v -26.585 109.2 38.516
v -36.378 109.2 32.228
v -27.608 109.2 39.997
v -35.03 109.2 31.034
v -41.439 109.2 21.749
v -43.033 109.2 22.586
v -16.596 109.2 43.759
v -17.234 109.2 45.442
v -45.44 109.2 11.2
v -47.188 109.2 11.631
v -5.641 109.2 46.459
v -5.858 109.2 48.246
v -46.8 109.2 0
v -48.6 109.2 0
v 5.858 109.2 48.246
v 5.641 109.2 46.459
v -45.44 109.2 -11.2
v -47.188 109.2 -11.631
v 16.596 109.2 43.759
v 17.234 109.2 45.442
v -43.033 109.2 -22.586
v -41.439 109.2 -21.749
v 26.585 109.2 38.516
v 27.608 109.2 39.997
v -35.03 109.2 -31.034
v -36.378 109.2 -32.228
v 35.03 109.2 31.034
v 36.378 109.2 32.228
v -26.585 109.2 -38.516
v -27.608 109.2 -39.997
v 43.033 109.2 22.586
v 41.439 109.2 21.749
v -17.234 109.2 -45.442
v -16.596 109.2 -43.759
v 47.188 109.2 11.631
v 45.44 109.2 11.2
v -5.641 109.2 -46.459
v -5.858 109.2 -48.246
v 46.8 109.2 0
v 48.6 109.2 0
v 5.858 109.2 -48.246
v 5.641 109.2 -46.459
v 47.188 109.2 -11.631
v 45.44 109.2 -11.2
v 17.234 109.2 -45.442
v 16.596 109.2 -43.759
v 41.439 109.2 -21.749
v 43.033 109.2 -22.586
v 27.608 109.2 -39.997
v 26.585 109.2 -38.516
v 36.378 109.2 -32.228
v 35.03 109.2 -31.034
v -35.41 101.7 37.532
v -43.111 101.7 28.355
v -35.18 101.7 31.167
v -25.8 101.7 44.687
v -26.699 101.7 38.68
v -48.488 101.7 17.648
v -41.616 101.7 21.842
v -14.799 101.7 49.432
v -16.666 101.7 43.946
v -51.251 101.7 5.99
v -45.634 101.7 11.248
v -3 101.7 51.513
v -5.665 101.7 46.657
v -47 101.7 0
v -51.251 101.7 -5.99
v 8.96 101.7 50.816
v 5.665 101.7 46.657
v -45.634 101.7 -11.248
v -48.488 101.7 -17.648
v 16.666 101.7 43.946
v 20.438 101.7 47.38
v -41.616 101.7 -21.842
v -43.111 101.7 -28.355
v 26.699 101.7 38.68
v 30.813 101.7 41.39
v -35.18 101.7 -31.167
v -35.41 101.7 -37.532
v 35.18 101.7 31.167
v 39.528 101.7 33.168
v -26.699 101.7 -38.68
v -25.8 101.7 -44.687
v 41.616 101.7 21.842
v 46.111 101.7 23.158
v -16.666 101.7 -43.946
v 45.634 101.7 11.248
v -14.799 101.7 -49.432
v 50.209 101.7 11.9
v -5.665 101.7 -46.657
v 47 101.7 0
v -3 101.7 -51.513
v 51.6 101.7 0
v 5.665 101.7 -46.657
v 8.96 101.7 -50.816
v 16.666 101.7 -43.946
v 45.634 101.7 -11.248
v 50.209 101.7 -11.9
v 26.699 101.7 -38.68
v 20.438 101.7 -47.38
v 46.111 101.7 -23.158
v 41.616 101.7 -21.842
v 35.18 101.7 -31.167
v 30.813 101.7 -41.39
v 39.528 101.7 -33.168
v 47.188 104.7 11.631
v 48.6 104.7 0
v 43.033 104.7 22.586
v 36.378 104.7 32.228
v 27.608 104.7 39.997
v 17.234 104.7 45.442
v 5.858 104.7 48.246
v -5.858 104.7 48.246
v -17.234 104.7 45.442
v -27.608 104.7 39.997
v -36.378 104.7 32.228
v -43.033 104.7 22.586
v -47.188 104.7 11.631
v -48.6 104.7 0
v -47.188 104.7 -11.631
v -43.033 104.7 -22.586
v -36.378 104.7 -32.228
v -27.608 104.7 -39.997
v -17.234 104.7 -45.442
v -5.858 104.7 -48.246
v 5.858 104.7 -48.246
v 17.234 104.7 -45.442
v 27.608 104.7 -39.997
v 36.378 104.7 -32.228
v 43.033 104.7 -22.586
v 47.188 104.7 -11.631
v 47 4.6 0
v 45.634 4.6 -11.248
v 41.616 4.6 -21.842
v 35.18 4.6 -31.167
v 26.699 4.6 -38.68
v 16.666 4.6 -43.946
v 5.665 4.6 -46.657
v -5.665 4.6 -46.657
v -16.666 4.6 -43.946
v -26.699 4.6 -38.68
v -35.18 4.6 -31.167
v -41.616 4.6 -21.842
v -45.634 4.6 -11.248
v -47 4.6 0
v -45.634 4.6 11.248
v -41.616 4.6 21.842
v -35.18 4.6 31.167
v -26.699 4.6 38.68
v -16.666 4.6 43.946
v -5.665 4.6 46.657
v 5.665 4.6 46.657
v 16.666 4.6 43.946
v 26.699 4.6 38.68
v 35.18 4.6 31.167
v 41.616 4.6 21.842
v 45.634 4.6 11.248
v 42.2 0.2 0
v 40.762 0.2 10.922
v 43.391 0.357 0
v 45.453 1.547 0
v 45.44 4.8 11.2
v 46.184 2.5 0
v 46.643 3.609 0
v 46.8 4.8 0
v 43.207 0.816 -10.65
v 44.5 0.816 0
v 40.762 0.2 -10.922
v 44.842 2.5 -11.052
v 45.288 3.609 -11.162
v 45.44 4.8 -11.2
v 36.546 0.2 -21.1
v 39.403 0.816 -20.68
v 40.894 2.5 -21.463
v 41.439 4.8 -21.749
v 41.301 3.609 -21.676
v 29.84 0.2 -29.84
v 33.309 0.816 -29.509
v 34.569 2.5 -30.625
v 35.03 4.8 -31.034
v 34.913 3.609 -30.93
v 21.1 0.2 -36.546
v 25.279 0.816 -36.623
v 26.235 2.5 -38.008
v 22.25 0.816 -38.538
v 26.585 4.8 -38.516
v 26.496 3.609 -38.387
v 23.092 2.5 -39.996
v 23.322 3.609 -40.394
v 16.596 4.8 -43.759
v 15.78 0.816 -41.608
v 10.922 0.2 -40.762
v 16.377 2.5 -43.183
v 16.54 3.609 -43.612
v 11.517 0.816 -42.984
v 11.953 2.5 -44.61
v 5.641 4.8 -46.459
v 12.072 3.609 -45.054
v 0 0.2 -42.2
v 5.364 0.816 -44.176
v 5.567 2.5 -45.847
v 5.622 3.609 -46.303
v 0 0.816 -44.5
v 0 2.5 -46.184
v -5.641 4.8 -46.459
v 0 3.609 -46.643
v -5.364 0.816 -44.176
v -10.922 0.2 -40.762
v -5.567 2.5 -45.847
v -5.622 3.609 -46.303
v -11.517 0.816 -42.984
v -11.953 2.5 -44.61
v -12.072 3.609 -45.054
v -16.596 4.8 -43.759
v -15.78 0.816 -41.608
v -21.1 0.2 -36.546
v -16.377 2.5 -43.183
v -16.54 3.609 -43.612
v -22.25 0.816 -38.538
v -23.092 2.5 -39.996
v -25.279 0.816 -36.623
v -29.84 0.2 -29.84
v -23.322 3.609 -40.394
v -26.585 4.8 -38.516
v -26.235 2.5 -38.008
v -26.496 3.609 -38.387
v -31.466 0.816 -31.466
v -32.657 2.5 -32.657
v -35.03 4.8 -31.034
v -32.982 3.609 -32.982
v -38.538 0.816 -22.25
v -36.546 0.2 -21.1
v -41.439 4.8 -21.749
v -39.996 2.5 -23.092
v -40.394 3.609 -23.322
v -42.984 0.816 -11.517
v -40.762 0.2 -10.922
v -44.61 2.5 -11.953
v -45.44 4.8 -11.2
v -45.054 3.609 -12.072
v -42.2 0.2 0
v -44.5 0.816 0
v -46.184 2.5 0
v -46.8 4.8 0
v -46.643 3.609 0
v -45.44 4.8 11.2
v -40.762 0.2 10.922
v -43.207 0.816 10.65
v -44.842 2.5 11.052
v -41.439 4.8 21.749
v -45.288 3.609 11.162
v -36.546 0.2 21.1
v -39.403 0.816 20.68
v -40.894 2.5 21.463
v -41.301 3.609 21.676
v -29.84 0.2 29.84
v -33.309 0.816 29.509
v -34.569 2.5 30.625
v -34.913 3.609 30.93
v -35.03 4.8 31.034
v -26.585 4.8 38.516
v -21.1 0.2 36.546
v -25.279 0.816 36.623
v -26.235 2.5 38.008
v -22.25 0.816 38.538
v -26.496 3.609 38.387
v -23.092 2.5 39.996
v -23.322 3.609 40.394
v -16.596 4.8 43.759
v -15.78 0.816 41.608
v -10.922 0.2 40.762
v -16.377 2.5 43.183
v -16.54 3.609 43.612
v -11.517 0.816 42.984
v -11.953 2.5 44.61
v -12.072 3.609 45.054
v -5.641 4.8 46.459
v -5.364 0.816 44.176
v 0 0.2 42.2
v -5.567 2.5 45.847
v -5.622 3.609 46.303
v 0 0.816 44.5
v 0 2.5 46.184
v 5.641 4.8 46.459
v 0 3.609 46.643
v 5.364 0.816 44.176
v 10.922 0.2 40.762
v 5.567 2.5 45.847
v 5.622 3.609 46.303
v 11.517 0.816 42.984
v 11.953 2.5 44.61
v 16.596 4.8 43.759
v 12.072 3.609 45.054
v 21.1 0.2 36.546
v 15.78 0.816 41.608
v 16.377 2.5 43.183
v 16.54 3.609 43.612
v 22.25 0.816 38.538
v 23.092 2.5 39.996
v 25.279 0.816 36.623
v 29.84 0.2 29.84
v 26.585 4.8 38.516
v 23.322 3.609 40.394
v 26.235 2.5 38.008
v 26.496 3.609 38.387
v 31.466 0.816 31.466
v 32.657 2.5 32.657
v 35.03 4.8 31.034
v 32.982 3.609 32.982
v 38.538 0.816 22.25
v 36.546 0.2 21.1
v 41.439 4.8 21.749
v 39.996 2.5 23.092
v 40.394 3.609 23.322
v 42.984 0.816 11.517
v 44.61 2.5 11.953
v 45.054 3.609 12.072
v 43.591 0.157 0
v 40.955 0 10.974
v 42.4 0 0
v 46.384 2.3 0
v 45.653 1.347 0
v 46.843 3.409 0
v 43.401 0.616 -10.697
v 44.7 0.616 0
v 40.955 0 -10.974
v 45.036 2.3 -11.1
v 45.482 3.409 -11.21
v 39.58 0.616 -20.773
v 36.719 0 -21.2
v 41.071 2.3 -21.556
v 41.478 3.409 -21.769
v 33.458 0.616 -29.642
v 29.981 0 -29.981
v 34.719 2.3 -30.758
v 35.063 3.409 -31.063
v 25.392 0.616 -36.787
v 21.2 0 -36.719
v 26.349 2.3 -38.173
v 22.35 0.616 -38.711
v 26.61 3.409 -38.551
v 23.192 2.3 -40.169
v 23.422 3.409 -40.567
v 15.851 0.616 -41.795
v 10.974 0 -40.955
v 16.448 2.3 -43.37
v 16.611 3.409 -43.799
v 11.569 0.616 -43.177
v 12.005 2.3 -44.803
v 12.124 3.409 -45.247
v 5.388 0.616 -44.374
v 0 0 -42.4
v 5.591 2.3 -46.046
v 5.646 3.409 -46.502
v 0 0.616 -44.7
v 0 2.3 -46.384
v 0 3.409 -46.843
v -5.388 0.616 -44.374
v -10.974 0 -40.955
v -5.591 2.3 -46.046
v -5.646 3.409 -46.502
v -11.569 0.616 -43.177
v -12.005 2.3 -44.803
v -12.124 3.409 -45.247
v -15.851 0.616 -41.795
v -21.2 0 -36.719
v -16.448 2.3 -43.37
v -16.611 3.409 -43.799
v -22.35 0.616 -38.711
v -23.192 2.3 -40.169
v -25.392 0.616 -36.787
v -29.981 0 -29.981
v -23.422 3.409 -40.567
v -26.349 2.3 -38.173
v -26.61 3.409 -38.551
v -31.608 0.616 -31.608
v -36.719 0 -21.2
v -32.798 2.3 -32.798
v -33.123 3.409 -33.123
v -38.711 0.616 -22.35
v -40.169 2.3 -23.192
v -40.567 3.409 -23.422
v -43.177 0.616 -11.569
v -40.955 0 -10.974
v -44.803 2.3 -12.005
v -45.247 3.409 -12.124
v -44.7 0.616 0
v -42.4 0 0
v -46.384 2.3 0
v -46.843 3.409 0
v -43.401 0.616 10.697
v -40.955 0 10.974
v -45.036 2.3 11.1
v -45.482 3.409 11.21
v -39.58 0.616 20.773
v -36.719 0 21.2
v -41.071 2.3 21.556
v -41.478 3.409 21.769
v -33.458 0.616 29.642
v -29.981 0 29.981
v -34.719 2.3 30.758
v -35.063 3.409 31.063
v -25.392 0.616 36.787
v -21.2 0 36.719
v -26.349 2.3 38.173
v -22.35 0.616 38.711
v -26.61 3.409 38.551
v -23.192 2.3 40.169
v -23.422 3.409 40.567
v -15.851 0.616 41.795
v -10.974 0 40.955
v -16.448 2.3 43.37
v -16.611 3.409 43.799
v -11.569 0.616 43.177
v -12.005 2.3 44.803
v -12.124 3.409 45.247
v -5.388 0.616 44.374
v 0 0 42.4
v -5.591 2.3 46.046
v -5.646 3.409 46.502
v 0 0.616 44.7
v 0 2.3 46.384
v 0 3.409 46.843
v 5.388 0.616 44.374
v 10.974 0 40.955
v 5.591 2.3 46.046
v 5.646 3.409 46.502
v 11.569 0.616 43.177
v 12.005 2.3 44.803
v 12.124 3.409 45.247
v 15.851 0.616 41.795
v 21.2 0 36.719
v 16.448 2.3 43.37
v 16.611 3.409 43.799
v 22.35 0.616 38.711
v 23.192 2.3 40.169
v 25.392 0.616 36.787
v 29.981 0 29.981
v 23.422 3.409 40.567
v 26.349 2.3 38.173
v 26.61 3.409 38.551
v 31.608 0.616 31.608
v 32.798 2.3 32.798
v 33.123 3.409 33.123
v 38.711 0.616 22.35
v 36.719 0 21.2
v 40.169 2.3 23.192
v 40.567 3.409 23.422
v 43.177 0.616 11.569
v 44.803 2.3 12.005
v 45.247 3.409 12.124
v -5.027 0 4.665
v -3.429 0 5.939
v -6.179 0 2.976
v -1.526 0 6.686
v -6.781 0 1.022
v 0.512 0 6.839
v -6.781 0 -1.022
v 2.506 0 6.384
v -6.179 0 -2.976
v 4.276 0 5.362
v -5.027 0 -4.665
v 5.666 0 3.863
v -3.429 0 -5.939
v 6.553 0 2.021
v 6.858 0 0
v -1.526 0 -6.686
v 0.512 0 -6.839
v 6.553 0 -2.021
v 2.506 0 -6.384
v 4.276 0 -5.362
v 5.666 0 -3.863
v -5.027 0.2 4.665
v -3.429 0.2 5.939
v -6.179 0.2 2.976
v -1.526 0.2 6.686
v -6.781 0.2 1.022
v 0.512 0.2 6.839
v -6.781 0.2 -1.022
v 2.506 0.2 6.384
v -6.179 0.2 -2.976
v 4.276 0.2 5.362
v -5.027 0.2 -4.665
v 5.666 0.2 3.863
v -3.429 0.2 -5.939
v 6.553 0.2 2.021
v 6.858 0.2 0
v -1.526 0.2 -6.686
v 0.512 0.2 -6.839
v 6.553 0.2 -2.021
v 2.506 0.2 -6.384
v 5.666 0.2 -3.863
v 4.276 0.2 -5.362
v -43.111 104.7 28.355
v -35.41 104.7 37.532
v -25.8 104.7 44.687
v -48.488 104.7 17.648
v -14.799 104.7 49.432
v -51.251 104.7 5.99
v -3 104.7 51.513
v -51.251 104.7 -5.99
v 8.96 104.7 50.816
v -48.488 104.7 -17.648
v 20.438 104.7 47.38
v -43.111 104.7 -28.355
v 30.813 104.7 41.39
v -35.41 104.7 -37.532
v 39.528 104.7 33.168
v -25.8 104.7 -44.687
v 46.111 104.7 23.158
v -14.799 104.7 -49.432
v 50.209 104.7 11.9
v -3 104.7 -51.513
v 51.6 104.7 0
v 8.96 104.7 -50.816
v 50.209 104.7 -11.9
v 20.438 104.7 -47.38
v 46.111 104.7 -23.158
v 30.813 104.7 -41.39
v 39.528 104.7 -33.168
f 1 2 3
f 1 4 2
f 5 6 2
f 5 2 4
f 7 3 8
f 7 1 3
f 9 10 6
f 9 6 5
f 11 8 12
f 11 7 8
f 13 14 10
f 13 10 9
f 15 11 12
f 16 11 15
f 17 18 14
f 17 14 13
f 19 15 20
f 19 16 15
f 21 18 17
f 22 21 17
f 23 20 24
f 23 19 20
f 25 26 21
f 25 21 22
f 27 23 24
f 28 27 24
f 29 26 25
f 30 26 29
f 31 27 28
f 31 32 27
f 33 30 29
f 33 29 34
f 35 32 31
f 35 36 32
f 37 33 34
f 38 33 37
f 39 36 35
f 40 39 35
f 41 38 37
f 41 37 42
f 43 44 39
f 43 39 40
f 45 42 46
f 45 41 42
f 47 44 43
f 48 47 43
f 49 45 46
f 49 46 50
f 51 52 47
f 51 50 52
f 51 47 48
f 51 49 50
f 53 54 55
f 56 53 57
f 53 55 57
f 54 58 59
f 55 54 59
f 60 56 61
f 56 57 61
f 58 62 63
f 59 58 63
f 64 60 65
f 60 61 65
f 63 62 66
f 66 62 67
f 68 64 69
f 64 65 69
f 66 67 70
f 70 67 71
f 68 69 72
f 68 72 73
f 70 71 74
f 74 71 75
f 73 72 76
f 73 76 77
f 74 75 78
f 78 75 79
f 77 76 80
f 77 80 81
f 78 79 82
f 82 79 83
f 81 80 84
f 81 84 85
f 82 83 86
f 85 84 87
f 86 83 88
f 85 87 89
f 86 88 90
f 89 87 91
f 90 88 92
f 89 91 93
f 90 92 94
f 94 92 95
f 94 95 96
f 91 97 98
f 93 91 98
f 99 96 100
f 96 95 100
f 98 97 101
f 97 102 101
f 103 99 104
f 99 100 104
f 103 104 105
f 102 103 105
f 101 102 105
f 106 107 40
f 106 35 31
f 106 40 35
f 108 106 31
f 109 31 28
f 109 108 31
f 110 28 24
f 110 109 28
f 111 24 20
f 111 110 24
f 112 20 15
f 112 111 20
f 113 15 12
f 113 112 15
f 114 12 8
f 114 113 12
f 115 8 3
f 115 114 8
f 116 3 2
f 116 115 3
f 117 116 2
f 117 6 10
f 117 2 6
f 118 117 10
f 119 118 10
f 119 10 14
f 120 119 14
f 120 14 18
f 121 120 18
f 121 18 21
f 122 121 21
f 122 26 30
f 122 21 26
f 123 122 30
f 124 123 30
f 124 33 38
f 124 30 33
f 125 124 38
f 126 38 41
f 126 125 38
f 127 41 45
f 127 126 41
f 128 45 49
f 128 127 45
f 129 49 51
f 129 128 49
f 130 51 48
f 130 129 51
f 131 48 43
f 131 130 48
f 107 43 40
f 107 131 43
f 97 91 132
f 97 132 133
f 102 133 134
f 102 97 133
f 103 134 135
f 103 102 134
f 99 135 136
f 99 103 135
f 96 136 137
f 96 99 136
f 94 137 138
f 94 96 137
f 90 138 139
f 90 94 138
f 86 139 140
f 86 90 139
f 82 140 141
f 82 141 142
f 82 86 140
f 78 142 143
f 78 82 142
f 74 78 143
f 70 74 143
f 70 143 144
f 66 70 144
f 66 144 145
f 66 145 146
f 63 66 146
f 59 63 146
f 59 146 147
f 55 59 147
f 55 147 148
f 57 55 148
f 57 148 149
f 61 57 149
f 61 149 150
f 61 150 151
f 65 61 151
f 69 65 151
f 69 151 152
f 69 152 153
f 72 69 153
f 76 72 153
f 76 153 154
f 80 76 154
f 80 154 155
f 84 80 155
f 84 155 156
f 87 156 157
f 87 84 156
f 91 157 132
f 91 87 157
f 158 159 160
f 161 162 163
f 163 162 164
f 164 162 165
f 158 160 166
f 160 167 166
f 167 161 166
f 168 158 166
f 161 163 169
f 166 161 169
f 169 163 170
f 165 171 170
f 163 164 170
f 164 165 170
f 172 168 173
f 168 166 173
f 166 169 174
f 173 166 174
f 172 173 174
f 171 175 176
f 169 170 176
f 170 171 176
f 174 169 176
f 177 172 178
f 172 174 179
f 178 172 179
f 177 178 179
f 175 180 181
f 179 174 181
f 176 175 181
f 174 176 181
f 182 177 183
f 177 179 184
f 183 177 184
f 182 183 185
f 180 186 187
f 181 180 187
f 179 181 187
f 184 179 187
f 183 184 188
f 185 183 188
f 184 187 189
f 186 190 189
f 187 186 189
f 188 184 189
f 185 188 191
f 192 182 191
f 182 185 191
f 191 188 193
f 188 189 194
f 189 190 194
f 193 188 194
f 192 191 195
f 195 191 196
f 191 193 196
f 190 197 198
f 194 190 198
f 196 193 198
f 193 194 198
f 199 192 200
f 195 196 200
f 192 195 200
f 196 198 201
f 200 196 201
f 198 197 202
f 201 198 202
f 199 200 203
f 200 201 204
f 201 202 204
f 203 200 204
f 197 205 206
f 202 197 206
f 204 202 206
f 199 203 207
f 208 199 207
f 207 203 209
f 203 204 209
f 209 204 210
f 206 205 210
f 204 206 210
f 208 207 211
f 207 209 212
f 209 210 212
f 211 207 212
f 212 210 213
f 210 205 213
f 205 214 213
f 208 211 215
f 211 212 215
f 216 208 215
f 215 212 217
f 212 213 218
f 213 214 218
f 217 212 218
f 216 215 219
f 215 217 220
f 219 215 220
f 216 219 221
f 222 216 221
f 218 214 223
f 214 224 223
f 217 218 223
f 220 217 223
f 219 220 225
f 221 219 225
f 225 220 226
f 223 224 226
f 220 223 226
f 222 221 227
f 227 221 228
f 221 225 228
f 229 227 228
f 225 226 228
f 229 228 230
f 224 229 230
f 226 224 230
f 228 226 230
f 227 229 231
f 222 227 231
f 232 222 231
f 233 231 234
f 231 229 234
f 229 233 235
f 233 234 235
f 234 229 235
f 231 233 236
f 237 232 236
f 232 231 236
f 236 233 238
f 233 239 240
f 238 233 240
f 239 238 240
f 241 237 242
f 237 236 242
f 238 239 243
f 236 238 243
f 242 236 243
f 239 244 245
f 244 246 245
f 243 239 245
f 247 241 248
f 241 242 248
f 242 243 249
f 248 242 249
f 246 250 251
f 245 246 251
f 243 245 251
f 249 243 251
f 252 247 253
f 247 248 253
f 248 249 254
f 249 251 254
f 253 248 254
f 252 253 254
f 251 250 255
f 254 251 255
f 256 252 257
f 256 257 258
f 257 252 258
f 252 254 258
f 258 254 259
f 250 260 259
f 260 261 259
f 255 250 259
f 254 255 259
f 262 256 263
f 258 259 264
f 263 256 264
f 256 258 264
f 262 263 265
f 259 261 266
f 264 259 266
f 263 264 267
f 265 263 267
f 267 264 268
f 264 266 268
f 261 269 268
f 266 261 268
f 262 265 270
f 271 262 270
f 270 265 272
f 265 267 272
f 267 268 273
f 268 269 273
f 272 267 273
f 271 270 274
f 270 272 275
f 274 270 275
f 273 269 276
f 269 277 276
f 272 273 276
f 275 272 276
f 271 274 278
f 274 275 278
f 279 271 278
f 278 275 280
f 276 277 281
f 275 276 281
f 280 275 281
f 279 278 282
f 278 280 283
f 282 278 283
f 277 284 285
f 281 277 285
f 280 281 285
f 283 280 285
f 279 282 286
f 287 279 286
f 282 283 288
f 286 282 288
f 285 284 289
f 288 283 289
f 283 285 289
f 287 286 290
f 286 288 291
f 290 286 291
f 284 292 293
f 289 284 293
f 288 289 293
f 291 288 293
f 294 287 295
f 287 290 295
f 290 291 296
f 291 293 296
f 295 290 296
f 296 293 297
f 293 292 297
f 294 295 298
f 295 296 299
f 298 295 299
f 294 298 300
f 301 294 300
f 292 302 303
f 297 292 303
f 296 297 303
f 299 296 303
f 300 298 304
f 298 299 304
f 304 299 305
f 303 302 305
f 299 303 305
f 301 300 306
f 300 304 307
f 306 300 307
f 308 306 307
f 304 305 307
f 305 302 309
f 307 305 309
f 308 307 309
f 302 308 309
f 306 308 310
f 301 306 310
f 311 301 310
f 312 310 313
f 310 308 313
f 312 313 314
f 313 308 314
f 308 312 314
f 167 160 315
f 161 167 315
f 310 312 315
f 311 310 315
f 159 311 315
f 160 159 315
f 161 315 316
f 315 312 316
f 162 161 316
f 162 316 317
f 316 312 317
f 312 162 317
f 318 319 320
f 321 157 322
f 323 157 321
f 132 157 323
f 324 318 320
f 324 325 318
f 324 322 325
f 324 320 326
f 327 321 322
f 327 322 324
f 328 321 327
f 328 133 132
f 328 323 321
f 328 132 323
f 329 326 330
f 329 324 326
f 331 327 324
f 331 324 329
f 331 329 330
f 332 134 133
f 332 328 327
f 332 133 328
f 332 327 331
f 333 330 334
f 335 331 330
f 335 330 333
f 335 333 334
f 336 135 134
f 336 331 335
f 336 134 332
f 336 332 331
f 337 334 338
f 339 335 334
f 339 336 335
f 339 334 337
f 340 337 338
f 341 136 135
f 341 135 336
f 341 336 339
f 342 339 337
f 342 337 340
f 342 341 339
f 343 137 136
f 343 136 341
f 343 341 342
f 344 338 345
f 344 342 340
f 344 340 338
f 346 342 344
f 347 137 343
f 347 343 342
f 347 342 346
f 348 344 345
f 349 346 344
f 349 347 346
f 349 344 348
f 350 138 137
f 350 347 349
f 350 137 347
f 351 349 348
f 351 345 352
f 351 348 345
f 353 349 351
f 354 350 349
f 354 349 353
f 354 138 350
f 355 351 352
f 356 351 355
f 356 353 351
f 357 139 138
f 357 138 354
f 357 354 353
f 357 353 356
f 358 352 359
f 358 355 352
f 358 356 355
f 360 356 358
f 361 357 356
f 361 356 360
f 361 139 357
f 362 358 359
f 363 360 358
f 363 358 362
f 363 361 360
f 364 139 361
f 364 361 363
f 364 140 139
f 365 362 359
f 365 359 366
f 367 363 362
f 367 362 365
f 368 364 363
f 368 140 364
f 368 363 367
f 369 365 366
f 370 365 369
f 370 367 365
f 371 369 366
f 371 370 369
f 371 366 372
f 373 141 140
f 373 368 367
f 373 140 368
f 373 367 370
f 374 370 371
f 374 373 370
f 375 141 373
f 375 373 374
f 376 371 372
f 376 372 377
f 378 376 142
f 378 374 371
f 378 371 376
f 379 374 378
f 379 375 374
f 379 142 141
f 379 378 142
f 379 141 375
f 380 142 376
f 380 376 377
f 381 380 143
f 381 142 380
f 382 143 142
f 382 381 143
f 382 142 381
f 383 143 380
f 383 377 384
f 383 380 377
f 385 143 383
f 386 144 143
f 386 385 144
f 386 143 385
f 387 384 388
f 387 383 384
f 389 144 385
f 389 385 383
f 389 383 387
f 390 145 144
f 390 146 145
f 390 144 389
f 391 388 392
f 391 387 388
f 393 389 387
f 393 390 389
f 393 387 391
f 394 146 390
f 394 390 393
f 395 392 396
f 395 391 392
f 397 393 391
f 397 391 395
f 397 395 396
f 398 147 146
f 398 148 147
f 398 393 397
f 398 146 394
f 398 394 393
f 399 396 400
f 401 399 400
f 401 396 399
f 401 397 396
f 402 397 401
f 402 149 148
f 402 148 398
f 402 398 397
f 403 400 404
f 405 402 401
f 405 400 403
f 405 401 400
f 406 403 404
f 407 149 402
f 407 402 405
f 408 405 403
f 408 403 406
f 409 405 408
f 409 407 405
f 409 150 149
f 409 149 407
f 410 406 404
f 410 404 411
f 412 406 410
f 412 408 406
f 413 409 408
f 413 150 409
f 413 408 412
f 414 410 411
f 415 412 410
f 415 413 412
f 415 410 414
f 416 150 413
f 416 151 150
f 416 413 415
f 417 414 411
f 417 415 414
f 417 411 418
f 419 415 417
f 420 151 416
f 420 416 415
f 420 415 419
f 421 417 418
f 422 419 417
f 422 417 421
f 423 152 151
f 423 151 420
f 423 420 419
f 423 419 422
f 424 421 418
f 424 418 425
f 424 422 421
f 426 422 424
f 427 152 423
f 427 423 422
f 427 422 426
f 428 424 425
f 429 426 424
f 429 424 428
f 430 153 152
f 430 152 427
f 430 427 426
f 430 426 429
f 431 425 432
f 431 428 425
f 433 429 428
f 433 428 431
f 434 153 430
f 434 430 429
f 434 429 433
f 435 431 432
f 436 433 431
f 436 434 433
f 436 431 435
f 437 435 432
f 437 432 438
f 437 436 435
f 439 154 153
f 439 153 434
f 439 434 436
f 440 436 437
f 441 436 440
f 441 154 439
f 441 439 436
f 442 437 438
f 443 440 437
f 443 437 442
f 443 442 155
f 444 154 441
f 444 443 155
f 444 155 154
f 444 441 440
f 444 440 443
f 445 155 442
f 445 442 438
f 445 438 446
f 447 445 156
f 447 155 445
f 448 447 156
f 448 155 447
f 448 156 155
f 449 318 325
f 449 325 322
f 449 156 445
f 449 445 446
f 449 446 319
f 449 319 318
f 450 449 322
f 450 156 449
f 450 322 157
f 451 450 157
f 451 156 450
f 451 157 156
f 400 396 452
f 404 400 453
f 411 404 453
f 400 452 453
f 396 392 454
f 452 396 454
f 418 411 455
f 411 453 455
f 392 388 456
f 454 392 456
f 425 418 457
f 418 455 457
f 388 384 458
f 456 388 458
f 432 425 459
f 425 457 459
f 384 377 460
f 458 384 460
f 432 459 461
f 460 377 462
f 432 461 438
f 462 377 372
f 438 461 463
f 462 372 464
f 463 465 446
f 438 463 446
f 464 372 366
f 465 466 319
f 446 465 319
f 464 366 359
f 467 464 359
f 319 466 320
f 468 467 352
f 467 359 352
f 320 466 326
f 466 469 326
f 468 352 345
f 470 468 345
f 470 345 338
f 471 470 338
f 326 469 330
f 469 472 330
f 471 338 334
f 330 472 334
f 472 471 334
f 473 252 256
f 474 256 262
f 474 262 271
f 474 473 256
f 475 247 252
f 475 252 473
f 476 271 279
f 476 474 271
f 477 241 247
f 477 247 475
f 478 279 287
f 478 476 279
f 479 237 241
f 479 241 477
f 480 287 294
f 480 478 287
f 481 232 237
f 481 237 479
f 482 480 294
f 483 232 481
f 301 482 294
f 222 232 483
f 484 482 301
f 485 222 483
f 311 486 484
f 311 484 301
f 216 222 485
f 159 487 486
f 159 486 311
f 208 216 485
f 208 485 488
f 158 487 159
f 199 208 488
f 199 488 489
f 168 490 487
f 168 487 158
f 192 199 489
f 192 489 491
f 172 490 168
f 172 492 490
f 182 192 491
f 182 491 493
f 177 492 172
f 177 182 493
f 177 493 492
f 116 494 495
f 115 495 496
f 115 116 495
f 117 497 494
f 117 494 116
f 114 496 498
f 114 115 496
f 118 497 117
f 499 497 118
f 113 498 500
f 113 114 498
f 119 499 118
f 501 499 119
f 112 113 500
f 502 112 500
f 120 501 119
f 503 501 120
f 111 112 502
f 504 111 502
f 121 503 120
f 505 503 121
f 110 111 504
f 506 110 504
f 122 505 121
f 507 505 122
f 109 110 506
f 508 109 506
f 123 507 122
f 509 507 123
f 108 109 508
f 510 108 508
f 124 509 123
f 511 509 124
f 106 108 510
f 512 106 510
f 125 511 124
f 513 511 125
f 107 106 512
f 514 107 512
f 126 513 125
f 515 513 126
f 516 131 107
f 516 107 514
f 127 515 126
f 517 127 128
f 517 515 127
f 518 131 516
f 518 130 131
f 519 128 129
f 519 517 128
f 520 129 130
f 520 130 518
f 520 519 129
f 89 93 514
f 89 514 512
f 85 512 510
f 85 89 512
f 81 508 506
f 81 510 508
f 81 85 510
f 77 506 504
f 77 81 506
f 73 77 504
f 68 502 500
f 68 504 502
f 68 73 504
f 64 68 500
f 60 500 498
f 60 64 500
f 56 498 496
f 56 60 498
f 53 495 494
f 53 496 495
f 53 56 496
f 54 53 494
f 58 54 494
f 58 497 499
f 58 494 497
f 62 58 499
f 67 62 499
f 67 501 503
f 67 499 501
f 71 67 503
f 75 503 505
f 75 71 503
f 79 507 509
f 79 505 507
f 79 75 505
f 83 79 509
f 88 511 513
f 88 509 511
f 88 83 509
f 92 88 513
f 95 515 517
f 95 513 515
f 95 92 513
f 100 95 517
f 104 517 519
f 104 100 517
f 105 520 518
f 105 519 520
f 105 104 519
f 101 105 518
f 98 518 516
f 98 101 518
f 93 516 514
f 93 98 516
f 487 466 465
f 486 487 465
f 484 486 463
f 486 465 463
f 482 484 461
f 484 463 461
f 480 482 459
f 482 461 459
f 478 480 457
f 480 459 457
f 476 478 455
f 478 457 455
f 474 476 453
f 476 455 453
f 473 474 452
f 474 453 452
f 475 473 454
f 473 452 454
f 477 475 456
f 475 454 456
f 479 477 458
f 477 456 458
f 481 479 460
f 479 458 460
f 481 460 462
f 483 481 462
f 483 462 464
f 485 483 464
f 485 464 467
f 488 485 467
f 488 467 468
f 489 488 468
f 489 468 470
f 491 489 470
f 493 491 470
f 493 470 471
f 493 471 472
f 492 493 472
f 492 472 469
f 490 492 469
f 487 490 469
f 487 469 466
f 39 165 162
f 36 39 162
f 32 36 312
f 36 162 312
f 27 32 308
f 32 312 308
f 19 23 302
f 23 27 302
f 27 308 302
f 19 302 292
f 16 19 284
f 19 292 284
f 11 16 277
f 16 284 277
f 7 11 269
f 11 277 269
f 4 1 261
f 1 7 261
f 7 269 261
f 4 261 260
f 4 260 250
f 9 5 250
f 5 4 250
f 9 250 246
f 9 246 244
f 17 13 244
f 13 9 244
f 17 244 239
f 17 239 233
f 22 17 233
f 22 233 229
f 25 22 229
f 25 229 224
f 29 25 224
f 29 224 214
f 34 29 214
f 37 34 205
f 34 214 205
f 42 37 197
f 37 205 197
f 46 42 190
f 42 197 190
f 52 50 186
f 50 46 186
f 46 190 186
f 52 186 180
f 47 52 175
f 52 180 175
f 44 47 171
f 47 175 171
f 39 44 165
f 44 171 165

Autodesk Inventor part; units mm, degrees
ref_plane "YZ Plane" through (0, 0, 0) normal (1, 0, 0) x (0, 1, 0)
ref_plane "XZ Plane" through (0, 0, 0) normal (0, 1, 0) x (-1, 0, 0)
ref_plane "XY Plane" through (0, 0, 0) normal (0, 0, 1) x (1, 0, 0)
sketch "Sketch1" plane through (0, 0, 0) normal (0, 0, 1) x (1, 0, 0)
  line L0 (46.8, 0) -> (47, 0)
  line L1 (47, 4.6) -> (47, 101.7)
  line L2 (47, 109.2) -> (46.8, 109.2)
  line L3 (46.8, 109.2) -> (46.8, 4.8)
  line L4 (46.8, 109.2) -> (48.6, 109.2)
  line L5 (48.6, 109.2) -> (48.6, 104.7)
  line L6 (48.6, 104.7) -> (51.6, 104.7)
  line L7 (51.6, 104.7) -> (51.6, 101.7)
  line L8 (51.6, 101.7) -> (48.6, 101.7)
  line L9 (48.6, 101.7) -> (47, 101.7)
  line L10 (0, 0) -> (0, 20.8136)
  line L11 (42.4, 0) -> (-0.2292, 0)
  line L12 (0, 0) -> (0, 0.2)
  line L13 (0, 0.2) -> (42.2, 0.2)
  arc A0 (42.2, 0.2) -> (46.8, 4.8) centre (42.2, 4.8) ccw
  arc A1 (42.4, 0) -> (47, 4.6) centre (42.4, 4.6) ccw
  dimension "d1" = 0.2
  dimension "d2" = 109.2
  dimension "d3" = 1.8
  dimension "d4" = 4.5
  dimension "d5" = 3
  dimension "d6" = 3
  dimension "d7" = 0.2
  dimension "d8" = 90
  dimension "d9" = 4.6
revolve "Revolution1" add sketch "Sketch1" angle 360 about axis through (0, 0, 0) along (0, 1, 0)
sketch "Sketch2" plane through (0, 0, 0) normal (0, -1, 0) x (1, 0, 0)
  circle A0 centre (0, 0) radius 6.858
  dimension "d11" = 13.716
extrude "Extrusion1" cut sketch "Sketch2" against normal blind 1
properties part number "ContenedorTest"
